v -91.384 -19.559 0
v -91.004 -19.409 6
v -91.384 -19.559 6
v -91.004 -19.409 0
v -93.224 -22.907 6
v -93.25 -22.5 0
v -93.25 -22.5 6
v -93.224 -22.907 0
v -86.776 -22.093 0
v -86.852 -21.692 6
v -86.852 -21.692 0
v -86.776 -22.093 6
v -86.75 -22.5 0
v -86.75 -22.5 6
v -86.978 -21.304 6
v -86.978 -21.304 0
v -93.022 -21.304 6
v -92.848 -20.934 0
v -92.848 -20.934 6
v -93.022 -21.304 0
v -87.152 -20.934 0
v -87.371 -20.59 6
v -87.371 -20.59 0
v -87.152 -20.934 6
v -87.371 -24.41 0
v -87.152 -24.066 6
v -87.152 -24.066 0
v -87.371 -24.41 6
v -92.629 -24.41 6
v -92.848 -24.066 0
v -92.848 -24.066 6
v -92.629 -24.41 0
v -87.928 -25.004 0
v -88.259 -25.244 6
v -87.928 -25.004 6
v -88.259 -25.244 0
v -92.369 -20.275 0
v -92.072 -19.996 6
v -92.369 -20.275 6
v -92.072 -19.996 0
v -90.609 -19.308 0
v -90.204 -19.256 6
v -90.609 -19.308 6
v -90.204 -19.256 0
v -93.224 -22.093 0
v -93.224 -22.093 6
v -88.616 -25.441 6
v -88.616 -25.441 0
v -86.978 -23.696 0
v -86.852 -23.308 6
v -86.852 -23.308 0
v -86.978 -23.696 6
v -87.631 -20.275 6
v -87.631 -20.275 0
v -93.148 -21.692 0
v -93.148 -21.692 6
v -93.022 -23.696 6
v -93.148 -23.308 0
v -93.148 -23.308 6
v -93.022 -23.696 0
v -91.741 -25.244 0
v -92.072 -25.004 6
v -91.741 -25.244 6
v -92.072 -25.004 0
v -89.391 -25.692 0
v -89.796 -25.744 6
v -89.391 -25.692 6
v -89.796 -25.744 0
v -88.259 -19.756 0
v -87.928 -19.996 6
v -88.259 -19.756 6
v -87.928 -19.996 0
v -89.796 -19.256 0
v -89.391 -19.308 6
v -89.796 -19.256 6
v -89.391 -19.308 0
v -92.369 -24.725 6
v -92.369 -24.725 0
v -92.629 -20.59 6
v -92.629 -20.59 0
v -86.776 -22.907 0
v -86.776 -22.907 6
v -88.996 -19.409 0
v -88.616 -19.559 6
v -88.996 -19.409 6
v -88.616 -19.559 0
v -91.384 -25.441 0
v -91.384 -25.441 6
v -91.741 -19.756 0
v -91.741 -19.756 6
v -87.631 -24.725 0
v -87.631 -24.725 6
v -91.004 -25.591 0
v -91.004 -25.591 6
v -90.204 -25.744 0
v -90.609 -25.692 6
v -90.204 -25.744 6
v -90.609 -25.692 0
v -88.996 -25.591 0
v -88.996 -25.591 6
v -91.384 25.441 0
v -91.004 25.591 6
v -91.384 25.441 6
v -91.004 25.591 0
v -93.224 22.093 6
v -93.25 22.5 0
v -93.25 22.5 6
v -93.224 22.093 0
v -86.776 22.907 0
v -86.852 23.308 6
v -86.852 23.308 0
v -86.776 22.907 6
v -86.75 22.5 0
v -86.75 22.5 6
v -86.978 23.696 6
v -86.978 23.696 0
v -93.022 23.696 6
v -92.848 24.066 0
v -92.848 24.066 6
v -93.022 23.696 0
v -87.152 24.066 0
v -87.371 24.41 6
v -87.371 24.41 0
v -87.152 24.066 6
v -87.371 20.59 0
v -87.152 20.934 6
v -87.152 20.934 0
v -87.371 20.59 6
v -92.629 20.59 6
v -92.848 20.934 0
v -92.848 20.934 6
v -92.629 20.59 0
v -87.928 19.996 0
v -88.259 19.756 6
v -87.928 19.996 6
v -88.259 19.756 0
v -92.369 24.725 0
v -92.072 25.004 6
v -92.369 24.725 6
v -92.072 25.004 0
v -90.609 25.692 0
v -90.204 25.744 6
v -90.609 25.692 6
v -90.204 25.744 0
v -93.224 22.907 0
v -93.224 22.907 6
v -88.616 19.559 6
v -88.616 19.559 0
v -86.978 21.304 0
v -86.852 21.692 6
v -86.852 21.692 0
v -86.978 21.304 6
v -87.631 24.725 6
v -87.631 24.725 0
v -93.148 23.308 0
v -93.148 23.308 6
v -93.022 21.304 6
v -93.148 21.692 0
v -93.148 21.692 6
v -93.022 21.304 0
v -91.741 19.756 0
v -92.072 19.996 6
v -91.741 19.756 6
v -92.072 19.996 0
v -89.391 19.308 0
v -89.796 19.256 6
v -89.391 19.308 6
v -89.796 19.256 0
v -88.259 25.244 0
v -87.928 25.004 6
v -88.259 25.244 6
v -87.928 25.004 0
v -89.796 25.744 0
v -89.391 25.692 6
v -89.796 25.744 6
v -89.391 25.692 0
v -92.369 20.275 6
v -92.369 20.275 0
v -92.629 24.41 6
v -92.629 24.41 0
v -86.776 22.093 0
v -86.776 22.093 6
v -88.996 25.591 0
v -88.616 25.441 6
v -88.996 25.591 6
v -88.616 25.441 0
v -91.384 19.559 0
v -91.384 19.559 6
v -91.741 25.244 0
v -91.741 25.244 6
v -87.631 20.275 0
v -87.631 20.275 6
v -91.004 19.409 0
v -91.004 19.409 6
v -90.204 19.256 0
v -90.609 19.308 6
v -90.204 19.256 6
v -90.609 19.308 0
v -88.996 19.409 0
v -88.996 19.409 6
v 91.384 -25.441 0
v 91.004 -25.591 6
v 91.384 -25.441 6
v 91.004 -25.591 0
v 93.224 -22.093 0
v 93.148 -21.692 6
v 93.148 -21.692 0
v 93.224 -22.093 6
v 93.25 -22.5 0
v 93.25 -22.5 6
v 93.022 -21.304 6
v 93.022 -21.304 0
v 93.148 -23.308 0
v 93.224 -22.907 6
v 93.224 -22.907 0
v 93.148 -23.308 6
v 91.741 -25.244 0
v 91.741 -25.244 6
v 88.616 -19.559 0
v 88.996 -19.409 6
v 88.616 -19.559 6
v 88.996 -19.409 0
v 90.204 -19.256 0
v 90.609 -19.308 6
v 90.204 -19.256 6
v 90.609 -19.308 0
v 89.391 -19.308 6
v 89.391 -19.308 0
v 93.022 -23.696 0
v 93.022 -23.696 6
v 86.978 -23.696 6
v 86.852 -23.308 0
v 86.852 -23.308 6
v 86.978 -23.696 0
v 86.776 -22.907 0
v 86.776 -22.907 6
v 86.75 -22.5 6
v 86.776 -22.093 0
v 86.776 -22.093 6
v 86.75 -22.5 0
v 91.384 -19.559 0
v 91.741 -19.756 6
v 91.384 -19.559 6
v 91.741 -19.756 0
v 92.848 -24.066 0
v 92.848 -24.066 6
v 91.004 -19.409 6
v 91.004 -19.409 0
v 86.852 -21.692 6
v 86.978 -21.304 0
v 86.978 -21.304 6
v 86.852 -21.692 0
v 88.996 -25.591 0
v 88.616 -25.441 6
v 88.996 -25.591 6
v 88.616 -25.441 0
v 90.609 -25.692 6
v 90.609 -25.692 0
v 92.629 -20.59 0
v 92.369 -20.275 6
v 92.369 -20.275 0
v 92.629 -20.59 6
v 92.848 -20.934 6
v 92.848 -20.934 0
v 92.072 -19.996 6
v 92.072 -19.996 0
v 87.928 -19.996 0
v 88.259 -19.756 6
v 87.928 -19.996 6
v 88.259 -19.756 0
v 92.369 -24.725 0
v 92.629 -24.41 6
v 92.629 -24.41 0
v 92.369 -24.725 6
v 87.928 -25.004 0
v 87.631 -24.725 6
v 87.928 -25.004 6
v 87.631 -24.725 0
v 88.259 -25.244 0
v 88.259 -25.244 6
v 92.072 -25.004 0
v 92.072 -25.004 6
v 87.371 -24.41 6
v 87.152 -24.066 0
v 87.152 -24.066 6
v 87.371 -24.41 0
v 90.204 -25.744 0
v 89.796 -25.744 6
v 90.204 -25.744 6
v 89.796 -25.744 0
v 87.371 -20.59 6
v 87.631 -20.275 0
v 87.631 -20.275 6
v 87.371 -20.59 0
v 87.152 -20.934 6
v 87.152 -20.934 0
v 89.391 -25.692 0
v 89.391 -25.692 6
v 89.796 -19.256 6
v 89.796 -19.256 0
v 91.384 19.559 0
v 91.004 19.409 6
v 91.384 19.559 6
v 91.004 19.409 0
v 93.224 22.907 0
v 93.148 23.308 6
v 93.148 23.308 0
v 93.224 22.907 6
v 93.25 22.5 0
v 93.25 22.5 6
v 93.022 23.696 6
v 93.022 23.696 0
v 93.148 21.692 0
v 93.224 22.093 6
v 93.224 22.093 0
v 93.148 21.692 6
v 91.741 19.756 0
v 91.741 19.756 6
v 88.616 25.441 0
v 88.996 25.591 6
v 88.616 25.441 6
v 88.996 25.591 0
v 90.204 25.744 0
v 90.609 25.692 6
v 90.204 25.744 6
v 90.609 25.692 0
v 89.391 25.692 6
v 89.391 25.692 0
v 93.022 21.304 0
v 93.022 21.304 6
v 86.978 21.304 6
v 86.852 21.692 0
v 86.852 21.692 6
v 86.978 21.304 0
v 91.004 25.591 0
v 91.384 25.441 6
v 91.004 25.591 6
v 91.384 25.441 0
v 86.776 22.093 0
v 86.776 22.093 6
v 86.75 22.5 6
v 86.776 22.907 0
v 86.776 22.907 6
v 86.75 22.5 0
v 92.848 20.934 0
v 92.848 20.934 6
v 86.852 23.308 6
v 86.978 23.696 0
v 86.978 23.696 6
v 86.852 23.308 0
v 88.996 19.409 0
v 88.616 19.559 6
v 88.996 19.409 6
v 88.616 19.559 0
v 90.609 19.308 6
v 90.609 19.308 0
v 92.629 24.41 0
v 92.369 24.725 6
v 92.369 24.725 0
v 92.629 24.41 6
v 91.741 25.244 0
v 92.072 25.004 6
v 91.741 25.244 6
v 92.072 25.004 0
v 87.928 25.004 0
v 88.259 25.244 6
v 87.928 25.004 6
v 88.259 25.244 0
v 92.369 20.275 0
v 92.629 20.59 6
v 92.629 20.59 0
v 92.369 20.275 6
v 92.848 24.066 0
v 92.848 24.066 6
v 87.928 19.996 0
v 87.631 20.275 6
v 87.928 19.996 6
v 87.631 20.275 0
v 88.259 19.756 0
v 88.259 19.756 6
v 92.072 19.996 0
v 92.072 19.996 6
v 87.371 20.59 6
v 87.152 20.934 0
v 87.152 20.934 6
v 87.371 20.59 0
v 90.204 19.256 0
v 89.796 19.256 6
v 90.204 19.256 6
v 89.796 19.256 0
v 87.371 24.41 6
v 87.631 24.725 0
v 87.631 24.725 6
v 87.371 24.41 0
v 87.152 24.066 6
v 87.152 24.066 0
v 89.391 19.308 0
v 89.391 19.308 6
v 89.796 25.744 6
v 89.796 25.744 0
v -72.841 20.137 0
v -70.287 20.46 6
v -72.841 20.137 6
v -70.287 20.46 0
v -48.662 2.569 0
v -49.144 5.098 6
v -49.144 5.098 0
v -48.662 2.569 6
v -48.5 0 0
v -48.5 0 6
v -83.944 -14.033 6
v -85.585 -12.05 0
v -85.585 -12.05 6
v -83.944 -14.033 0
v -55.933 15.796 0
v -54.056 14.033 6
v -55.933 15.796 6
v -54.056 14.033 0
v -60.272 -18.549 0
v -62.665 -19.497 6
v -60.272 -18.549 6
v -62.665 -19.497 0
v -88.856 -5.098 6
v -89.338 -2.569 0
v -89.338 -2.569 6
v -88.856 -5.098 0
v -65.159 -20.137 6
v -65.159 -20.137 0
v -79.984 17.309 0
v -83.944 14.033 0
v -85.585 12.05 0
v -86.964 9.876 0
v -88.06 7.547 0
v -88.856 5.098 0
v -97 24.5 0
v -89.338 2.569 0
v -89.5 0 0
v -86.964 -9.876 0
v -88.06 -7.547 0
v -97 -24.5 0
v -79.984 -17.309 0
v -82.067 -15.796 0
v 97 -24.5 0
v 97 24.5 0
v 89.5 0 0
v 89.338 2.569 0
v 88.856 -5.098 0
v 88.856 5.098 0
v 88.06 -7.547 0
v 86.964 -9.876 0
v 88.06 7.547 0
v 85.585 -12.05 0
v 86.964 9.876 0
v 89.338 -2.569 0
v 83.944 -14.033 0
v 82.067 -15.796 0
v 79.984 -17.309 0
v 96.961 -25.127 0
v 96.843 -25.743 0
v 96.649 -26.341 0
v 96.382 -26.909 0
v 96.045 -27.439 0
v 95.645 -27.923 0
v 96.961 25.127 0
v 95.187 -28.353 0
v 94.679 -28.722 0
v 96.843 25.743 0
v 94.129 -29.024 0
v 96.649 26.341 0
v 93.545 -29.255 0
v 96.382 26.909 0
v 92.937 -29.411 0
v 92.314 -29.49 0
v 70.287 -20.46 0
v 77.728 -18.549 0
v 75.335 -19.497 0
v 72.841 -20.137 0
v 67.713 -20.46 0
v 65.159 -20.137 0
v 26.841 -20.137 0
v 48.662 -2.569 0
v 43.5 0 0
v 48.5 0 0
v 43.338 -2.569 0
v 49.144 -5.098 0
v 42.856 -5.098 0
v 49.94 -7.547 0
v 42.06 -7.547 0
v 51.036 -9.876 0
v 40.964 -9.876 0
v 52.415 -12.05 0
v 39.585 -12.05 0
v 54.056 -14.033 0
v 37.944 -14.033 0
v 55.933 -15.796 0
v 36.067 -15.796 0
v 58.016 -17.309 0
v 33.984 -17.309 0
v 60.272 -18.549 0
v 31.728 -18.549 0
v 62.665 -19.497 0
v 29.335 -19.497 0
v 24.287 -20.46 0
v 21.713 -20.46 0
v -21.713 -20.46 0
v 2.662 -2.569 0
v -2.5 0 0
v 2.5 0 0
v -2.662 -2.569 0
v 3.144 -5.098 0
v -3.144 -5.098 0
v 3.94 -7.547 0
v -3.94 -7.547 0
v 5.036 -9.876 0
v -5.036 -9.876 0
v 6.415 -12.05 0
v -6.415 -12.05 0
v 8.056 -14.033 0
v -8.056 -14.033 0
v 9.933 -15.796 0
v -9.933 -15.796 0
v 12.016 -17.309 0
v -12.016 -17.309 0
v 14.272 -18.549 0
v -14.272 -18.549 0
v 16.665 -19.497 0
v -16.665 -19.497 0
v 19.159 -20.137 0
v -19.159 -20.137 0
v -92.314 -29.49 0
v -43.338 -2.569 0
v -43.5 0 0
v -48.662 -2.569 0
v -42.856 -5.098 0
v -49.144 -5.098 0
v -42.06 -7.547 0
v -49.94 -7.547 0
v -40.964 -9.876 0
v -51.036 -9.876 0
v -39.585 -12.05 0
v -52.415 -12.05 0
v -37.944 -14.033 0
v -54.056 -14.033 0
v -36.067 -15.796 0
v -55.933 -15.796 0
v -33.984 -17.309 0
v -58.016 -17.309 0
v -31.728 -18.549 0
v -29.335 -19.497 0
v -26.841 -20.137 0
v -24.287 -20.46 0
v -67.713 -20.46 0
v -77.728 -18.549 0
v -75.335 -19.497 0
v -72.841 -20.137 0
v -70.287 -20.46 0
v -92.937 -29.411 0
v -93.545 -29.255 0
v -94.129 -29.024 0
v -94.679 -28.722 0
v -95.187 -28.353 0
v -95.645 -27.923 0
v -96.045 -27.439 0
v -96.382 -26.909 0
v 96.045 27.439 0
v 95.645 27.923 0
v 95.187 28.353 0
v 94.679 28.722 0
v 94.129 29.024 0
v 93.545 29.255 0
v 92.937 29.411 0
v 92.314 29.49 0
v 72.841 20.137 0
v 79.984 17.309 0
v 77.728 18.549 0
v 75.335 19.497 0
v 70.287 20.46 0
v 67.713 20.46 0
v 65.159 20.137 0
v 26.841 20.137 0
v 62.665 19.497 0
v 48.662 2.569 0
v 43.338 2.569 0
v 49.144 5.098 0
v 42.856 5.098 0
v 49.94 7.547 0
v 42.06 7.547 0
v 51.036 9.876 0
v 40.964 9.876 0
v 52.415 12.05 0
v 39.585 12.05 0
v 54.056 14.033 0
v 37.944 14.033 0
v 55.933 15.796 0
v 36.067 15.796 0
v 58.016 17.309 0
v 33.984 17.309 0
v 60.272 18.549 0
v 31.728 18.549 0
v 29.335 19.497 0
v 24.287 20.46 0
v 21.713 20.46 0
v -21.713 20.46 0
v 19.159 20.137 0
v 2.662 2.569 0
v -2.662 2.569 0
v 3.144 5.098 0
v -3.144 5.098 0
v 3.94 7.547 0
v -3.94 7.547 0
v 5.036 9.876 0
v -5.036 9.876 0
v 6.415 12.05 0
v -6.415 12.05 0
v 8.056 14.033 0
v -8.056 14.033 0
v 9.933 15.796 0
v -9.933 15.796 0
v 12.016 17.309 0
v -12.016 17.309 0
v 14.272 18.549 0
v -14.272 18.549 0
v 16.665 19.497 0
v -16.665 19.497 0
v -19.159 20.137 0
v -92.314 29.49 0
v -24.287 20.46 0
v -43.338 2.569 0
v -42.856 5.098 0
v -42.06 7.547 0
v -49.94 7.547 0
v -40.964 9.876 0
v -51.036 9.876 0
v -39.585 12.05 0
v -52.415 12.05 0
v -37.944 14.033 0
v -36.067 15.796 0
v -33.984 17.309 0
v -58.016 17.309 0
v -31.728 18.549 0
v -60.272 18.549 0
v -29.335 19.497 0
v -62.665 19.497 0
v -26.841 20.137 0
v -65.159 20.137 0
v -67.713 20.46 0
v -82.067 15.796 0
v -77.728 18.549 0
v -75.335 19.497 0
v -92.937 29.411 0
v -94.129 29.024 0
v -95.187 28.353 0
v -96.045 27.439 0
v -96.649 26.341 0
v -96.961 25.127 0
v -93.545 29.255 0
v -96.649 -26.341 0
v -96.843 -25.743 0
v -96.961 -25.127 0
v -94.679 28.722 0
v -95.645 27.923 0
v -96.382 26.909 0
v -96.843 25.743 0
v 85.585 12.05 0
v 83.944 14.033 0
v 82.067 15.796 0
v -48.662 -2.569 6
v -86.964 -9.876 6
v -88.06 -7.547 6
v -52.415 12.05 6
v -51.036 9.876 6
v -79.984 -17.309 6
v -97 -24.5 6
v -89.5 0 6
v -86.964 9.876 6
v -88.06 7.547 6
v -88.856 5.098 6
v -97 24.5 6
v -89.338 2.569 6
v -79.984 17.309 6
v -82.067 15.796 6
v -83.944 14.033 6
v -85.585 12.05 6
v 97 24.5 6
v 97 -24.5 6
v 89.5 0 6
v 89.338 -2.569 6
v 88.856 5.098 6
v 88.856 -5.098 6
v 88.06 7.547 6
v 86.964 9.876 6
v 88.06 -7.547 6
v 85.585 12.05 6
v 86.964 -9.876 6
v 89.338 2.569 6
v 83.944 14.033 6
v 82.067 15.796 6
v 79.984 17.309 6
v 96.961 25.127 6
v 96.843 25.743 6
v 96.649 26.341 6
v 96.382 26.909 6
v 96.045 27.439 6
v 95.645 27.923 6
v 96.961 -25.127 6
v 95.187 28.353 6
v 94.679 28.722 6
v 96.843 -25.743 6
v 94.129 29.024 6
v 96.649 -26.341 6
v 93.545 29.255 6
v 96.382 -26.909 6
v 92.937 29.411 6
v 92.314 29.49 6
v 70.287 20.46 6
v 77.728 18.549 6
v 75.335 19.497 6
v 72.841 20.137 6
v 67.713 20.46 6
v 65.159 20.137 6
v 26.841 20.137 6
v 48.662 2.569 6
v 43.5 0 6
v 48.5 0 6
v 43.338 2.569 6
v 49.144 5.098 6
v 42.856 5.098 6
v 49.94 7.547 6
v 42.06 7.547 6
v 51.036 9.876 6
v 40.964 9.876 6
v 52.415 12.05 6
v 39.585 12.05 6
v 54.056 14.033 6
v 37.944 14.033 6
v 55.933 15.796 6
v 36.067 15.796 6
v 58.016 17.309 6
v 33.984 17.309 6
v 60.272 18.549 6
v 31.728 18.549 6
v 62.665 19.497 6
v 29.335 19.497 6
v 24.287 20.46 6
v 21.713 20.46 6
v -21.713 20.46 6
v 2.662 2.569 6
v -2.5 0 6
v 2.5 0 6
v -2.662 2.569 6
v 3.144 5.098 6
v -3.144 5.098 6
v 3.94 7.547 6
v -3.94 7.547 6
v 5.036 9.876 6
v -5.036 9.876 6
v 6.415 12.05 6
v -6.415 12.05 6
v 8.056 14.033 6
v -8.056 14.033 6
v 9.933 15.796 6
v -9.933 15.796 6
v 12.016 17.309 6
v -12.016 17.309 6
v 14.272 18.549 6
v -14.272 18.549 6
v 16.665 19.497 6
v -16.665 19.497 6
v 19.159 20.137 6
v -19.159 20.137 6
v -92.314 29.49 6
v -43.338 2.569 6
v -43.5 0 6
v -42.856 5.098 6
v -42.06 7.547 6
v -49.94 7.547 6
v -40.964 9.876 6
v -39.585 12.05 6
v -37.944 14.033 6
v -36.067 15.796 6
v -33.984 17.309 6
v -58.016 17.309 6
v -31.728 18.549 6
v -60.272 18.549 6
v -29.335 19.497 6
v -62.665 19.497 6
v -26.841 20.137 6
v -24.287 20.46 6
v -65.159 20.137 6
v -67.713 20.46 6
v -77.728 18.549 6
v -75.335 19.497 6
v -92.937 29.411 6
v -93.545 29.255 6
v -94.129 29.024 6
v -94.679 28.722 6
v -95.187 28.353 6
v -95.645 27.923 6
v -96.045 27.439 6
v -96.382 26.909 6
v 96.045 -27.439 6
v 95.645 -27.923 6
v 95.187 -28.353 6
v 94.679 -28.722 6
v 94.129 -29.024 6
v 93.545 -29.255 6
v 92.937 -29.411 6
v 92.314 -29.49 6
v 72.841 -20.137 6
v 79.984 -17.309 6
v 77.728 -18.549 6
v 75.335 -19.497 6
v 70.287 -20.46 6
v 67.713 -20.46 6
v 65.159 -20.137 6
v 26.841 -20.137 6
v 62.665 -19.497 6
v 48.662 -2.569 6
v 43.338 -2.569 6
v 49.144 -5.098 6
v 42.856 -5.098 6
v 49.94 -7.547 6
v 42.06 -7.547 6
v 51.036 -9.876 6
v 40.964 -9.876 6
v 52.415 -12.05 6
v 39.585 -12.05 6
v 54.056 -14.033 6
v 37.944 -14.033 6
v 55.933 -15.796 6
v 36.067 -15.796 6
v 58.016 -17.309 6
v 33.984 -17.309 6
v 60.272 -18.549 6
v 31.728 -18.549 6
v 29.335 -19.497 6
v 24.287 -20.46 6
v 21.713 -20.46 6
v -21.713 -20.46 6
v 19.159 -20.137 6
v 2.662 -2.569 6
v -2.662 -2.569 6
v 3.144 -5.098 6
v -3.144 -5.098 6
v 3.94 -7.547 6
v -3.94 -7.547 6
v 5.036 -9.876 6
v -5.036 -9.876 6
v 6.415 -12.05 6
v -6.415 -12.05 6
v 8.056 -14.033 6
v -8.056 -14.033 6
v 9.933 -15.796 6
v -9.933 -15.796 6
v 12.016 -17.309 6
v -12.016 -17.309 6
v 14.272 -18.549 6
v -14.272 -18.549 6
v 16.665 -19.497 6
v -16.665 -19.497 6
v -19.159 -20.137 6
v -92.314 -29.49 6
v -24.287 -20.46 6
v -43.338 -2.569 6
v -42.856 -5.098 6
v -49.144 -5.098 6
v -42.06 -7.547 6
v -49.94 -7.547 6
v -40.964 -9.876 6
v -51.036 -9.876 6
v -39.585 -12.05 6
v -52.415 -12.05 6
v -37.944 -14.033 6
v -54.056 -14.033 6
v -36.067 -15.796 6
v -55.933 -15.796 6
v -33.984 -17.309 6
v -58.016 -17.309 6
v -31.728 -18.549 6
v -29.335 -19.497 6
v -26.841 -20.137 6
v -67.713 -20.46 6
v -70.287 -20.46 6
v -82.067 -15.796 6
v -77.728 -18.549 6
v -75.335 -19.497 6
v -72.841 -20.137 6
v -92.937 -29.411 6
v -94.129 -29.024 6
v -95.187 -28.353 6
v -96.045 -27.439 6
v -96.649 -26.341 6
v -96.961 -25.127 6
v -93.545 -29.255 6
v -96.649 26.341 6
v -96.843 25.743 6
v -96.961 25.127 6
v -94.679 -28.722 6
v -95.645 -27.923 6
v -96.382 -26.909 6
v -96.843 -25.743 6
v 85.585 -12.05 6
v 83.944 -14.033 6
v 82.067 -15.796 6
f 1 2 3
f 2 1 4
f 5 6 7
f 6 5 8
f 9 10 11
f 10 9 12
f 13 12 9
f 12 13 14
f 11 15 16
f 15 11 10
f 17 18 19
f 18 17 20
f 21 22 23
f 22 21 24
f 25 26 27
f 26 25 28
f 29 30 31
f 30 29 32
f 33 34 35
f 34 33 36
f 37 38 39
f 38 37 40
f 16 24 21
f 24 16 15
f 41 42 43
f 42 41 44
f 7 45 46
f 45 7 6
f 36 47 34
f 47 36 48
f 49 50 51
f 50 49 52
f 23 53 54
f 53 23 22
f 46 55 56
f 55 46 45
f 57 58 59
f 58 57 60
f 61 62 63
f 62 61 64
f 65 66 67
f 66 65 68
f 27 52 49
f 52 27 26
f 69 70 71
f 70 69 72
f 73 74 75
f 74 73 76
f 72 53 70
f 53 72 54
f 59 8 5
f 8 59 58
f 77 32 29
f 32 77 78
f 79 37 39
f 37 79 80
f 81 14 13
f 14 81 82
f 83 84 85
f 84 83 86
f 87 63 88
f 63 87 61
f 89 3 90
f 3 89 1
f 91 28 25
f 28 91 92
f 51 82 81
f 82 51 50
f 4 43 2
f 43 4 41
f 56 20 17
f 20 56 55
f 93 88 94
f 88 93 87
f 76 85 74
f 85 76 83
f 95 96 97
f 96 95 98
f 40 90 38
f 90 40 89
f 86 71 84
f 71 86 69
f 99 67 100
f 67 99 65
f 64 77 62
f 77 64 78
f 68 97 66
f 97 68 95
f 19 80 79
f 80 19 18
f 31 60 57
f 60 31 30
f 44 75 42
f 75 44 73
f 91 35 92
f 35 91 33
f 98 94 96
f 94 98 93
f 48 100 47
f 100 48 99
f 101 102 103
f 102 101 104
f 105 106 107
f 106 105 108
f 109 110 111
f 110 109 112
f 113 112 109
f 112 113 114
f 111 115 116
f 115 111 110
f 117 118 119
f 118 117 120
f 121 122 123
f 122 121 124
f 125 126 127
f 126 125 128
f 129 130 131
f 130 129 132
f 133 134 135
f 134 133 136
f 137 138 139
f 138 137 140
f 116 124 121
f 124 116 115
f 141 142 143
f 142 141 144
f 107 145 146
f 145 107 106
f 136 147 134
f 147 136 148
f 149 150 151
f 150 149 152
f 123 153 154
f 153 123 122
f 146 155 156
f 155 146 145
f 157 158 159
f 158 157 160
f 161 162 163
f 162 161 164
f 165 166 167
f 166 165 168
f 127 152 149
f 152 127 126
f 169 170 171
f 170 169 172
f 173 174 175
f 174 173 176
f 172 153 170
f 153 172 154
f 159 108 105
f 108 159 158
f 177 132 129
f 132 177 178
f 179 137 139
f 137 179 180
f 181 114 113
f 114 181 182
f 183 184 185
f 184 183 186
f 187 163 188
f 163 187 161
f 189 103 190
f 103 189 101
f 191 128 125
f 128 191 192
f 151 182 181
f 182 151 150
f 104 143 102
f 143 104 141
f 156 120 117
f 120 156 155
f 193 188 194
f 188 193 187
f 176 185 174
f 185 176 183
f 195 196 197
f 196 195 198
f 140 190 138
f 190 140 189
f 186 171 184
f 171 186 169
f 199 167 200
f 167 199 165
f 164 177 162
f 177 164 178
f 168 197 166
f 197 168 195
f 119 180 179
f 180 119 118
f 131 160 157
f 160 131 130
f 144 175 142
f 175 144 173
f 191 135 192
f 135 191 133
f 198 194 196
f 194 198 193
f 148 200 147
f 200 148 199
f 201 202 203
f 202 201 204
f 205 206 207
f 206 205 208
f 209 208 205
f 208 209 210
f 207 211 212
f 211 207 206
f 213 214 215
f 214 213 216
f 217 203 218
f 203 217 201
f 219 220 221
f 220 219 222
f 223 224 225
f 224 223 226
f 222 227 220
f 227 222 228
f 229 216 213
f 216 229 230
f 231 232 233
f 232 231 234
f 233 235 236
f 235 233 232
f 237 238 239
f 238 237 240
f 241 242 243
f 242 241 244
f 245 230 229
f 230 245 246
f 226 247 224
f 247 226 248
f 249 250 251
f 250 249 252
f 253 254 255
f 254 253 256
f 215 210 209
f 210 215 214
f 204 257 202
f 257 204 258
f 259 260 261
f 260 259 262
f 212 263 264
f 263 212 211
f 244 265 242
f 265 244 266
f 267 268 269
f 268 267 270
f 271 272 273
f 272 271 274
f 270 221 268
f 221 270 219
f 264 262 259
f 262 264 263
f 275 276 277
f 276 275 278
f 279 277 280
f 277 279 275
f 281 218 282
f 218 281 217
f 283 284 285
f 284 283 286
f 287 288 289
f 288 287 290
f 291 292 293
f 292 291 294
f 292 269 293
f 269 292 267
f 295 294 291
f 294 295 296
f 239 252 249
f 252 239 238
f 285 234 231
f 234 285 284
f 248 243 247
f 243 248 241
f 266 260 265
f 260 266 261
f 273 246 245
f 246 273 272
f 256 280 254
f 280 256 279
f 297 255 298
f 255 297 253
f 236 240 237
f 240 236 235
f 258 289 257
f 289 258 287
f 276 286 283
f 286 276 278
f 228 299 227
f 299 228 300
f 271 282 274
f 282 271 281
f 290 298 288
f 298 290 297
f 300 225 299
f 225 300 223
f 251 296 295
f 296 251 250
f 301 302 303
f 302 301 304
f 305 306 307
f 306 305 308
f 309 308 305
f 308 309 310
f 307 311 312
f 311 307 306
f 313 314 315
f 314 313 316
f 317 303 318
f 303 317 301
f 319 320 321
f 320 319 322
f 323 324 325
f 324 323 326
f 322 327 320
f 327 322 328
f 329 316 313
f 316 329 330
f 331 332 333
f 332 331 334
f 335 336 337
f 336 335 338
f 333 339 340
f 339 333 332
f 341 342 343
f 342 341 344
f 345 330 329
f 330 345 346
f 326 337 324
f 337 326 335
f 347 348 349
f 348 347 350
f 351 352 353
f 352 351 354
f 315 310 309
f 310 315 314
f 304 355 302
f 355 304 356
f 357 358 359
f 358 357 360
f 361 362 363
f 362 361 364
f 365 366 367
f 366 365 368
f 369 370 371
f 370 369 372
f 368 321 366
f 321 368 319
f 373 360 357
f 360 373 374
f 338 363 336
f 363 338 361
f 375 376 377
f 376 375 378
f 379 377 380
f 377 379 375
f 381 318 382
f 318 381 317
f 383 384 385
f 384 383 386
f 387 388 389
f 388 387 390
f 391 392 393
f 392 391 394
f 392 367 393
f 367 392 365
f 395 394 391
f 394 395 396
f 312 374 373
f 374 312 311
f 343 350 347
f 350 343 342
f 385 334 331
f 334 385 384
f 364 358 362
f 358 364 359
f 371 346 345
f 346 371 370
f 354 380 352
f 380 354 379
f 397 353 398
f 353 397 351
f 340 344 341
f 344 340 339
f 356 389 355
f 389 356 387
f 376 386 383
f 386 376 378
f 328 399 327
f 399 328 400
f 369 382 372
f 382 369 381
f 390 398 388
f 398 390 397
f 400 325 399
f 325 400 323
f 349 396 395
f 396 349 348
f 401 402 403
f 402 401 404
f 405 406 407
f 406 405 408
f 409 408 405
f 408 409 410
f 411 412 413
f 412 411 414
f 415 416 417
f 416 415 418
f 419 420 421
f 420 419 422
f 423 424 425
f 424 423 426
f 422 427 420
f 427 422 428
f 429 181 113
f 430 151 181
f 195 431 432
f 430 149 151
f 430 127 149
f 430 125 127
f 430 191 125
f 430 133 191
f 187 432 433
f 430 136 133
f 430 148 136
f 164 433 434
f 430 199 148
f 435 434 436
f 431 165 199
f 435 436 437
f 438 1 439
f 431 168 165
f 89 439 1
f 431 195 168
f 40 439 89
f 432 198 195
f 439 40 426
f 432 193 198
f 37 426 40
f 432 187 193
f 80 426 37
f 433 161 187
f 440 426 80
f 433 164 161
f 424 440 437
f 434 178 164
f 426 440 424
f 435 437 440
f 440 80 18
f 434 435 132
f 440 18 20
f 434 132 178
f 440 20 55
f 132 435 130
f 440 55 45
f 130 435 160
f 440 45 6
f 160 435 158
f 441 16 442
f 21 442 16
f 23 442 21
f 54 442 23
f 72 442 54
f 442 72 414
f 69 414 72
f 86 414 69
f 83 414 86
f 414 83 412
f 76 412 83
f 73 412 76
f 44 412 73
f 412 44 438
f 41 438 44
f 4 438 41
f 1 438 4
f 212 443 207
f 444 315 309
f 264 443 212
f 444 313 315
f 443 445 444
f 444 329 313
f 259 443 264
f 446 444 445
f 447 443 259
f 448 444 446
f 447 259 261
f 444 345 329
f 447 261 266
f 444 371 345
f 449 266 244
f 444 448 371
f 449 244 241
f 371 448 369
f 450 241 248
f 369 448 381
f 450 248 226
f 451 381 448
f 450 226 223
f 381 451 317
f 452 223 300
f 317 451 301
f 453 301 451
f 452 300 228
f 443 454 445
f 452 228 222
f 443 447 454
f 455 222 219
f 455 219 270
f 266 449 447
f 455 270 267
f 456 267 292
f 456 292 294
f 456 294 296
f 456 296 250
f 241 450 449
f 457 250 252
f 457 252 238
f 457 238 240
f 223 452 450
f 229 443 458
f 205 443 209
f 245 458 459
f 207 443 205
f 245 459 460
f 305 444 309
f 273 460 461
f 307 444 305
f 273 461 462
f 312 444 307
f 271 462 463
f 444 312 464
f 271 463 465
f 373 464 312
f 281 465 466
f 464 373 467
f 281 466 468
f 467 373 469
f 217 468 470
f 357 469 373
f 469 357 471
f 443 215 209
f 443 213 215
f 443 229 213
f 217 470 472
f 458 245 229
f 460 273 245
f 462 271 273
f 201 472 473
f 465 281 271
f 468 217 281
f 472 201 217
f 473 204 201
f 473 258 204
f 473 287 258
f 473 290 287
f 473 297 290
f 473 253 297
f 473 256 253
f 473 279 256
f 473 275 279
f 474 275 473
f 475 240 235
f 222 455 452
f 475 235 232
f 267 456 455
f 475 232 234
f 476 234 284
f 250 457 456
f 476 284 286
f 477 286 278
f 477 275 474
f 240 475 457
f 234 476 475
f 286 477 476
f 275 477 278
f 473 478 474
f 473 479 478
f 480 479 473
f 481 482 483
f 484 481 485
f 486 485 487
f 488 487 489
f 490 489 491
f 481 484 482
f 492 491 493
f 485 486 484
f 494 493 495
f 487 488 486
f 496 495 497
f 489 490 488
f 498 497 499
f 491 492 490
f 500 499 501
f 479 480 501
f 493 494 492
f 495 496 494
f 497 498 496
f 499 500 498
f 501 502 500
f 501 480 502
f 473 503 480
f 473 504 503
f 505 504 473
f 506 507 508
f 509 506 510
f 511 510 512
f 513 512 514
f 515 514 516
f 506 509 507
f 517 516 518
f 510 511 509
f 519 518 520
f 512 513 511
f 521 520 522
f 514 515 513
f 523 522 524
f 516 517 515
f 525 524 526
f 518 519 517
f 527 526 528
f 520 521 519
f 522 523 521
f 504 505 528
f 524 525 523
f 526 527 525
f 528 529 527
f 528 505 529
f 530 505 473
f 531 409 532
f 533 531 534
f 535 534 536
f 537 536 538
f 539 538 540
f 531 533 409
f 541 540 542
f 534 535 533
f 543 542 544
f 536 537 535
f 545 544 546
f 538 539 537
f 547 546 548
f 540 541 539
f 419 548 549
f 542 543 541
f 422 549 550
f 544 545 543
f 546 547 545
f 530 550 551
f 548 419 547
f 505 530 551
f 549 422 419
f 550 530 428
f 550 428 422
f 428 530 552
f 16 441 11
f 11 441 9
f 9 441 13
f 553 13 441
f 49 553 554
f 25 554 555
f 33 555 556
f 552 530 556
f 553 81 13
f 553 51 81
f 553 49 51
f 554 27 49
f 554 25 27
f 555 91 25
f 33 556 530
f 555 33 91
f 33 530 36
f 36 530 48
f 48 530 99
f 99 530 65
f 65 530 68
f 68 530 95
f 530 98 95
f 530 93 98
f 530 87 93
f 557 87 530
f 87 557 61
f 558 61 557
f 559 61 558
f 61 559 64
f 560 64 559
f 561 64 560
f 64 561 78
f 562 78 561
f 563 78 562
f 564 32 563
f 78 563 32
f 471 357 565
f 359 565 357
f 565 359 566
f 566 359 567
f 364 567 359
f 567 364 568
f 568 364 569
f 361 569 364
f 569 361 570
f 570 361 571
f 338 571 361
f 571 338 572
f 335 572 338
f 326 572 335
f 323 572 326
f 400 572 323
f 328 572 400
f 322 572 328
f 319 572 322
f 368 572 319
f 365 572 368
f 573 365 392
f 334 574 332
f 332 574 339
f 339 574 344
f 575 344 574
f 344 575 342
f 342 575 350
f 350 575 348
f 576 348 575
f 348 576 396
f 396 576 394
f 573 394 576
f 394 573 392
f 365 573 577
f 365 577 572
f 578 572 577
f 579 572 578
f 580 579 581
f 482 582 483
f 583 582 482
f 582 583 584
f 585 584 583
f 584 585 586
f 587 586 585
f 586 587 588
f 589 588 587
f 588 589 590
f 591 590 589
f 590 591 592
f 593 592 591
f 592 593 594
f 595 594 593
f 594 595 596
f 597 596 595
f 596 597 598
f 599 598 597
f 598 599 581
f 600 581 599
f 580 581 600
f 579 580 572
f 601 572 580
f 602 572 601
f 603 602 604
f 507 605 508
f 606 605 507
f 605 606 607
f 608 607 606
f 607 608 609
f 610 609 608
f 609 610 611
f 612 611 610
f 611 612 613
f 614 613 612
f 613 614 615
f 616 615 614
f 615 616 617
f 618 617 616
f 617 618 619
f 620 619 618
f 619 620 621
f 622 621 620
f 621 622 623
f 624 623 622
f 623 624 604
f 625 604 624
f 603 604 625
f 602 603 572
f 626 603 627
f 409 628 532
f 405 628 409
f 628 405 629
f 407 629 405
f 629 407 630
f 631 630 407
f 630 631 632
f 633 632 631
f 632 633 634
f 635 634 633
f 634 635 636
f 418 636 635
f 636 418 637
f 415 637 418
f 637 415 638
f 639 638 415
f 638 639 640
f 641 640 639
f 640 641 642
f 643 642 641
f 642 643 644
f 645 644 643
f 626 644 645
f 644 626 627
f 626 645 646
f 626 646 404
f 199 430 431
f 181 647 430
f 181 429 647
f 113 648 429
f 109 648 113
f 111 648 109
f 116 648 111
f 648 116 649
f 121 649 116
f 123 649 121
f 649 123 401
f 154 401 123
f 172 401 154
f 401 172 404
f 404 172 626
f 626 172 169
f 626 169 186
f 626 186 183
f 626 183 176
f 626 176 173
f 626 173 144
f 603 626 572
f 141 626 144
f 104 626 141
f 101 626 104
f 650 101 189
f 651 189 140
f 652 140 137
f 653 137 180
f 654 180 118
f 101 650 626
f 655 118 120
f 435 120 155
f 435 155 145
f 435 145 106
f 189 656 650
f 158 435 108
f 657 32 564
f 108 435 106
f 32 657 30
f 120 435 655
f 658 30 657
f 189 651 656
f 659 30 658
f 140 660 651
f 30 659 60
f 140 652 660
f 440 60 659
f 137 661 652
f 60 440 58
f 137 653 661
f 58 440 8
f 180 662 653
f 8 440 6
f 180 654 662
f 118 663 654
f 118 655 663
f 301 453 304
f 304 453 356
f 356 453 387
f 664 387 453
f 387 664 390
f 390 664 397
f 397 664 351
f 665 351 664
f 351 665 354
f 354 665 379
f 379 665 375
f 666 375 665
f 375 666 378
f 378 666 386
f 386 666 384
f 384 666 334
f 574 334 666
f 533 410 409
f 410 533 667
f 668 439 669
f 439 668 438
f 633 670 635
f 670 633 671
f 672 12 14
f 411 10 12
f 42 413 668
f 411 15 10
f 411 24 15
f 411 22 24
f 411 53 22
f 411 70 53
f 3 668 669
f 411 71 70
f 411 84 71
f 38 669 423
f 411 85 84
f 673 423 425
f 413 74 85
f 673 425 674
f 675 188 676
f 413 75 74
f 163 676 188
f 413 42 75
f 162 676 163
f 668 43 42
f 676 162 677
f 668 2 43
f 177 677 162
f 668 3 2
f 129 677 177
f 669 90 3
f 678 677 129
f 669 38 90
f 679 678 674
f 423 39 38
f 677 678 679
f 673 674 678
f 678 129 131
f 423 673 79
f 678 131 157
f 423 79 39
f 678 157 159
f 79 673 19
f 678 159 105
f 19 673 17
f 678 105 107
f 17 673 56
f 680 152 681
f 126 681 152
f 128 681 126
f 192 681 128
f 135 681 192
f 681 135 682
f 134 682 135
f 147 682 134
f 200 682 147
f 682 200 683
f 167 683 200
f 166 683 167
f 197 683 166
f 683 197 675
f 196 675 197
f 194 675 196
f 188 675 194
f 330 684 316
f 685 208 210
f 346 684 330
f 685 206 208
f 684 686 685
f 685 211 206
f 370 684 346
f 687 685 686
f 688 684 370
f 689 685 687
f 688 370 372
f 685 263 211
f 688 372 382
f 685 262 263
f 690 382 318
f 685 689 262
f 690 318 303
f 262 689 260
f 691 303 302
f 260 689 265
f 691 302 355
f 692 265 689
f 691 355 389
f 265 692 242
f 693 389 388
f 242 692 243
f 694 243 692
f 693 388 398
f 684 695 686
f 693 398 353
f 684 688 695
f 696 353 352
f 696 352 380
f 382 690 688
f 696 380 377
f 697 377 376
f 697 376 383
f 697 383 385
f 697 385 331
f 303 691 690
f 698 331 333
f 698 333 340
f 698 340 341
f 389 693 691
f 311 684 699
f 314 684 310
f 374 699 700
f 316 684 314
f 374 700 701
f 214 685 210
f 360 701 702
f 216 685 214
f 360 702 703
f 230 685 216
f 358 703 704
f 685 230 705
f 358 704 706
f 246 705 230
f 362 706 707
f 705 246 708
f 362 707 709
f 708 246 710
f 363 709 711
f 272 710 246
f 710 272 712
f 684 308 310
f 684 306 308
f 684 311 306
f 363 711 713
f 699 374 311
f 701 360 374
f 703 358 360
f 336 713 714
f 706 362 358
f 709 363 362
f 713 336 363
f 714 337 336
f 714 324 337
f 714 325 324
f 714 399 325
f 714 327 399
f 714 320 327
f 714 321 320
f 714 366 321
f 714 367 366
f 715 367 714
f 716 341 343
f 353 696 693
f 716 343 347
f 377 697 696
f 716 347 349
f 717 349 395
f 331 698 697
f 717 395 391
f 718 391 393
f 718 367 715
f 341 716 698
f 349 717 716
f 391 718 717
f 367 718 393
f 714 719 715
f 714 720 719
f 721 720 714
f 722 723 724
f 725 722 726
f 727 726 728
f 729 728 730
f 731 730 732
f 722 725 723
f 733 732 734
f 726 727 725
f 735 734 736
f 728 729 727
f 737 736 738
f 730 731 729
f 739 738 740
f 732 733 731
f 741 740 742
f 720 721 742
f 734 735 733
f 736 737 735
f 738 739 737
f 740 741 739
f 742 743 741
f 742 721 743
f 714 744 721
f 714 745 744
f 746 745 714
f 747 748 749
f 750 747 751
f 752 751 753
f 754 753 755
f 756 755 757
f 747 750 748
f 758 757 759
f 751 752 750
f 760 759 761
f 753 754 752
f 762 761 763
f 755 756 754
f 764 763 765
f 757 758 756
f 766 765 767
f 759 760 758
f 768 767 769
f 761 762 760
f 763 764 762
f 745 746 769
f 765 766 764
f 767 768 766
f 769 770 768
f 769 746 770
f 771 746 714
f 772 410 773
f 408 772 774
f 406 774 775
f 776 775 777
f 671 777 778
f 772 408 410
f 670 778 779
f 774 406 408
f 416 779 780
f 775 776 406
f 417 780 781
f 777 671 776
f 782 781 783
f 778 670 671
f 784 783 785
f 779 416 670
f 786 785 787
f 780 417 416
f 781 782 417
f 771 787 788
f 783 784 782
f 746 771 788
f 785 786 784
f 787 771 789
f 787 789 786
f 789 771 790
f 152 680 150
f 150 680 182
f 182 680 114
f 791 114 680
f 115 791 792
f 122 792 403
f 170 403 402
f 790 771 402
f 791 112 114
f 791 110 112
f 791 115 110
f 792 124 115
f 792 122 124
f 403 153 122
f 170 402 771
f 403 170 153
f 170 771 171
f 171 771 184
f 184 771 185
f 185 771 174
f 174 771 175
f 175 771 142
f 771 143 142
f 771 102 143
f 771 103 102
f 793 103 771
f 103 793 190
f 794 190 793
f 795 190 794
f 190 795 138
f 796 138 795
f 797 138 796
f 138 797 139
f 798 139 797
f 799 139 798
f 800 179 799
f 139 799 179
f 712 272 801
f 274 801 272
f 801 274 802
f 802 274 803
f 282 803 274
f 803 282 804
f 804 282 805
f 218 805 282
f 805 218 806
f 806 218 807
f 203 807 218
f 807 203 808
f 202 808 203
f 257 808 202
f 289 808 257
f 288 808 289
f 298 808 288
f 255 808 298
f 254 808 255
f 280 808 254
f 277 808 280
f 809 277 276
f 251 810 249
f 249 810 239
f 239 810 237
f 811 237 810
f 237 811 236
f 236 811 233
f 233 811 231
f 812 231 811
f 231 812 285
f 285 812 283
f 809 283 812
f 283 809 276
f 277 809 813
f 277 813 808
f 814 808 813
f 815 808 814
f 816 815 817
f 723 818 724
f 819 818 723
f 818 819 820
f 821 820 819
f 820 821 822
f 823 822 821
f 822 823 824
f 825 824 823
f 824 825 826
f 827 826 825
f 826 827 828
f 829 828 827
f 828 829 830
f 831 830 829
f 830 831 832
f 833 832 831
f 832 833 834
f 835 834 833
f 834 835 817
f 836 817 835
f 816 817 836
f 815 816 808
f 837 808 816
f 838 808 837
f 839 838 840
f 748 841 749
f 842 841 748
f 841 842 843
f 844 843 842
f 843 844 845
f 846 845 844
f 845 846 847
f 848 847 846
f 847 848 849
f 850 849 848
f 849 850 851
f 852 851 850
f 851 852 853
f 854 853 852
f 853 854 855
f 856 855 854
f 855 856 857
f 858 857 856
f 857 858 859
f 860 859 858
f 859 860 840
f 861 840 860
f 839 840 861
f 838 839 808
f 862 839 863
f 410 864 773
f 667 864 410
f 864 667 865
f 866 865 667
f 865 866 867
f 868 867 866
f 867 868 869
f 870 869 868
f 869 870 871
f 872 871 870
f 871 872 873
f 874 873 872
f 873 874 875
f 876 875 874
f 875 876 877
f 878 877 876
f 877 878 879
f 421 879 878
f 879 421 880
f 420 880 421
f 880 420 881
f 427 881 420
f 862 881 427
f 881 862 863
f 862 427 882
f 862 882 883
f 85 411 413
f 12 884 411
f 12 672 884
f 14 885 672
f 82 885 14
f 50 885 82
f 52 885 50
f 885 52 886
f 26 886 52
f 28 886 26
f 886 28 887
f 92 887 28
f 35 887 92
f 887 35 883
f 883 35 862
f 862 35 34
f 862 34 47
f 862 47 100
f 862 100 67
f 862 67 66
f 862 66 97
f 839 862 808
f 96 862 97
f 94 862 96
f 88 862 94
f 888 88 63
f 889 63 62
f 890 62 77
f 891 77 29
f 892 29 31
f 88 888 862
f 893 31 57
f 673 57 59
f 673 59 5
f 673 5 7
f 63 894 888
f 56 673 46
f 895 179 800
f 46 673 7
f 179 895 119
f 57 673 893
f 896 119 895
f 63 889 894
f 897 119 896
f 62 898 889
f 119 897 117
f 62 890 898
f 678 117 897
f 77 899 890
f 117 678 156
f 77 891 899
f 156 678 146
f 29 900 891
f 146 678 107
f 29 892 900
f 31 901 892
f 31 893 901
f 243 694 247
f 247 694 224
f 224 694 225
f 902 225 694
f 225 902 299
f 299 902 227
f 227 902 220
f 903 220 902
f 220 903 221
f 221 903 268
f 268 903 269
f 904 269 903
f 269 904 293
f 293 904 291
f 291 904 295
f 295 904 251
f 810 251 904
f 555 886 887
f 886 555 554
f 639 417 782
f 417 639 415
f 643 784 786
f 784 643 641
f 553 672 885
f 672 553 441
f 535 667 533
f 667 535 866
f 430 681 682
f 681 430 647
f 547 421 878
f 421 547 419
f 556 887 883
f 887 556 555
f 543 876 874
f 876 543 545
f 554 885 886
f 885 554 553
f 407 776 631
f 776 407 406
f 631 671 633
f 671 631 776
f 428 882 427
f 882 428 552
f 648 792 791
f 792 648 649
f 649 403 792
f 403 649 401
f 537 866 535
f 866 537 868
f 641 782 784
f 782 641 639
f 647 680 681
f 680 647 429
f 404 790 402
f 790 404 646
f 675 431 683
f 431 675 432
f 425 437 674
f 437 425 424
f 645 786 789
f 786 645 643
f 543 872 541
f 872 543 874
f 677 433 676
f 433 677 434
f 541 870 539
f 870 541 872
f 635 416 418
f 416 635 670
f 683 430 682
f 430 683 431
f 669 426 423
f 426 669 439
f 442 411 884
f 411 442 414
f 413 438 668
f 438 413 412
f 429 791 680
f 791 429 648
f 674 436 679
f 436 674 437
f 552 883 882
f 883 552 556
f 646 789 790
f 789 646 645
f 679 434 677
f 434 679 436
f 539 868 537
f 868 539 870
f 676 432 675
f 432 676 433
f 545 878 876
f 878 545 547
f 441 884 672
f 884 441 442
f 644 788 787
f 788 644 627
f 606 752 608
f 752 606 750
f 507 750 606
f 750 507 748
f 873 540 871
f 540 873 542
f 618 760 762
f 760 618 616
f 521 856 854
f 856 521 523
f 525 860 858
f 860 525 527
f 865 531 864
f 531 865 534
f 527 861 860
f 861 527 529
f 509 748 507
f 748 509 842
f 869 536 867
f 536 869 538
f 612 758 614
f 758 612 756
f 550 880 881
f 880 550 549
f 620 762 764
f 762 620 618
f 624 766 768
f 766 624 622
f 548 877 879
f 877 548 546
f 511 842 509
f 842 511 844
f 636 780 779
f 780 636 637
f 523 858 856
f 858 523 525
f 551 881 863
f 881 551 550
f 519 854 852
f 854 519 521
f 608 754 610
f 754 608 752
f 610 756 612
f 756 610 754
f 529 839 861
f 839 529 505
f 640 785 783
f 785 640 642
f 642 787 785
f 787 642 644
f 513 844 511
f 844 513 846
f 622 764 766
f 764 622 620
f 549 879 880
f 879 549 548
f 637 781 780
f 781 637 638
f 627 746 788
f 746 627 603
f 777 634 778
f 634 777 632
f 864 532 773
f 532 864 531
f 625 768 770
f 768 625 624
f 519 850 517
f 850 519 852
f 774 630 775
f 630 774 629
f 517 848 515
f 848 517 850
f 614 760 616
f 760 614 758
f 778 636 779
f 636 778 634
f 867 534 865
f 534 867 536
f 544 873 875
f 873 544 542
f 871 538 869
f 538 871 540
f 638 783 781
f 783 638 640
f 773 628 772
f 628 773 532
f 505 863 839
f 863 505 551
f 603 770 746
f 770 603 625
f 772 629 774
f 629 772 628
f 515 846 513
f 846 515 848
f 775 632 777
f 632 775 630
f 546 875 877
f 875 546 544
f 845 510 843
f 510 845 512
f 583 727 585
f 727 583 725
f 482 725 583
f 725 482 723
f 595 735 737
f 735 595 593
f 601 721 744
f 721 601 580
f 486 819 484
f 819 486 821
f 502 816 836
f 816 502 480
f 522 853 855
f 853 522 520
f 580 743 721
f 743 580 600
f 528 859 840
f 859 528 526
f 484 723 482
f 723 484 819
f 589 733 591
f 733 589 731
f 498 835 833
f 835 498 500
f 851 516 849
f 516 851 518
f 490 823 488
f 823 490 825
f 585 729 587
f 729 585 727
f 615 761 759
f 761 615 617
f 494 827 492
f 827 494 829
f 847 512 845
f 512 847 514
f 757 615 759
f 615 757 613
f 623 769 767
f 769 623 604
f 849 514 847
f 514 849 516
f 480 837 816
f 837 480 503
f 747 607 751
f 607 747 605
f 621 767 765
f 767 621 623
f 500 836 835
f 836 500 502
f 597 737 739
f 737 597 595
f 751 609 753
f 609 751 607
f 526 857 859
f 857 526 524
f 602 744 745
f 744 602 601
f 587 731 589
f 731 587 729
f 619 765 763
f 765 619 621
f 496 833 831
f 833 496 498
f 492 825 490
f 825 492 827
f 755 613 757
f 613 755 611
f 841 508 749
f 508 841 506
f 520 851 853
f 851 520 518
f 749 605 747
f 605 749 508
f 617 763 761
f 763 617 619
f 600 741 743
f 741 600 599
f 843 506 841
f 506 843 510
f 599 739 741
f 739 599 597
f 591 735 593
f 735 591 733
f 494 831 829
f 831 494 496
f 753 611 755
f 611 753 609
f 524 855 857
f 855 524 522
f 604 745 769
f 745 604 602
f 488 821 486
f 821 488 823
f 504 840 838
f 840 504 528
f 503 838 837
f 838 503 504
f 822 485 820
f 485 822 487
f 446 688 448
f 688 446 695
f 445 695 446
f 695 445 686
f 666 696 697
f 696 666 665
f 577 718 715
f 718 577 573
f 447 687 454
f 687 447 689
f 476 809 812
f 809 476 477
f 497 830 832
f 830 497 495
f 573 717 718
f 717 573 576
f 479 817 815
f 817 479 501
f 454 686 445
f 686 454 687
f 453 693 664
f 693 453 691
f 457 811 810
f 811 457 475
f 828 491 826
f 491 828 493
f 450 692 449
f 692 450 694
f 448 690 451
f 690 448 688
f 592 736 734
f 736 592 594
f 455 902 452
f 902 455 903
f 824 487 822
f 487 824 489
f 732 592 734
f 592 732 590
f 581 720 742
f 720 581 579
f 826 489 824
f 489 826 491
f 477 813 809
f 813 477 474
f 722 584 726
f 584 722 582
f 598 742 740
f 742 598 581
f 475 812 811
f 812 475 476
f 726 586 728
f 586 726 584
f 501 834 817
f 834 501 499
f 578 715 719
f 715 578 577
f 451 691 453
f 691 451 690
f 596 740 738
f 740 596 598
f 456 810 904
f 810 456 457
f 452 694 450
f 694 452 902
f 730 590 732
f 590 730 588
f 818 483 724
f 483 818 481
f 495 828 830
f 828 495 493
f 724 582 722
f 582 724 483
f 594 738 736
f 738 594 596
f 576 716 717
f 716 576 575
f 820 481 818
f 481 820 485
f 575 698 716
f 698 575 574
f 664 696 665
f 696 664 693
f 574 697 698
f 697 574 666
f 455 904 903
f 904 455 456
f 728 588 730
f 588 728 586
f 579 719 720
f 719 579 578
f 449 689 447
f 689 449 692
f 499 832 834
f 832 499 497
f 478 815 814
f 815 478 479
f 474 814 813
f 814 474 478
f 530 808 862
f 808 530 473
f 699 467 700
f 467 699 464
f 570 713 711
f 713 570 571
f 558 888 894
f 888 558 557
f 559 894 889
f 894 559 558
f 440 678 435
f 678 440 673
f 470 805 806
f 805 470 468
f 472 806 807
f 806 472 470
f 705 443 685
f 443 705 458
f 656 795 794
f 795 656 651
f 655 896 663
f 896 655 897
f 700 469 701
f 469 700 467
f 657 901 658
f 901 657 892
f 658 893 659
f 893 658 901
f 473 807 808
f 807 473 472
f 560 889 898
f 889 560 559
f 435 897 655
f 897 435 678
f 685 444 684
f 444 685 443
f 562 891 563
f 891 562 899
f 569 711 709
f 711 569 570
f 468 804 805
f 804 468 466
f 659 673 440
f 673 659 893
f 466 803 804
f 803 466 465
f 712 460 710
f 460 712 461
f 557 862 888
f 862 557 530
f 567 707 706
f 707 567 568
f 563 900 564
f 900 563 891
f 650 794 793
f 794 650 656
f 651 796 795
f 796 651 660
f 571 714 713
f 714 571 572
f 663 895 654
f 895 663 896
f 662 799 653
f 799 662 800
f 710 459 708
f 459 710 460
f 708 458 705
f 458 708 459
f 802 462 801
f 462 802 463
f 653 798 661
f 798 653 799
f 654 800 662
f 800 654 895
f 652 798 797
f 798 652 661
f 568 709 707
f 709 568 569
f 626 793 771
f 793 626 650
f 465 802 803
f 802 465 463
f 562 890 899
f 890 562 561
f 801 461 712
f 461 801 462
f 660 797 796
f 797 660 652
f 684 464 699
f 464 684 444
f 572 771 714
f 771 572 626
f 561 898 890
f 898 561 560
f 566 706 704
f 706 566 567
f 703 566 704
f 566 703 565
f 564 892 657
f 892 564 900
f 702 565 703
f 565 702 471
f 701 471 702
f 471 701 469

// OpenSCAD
$fn = 50;


difference() {
	union() {
		hull() {
			translate(v = [-92.0000000000, 24.5000000000, 0]) {
				cylinder(h = 6, r = 5);
			}
			translate(v = [92.0000000000, 24.5000000000, 0]) {
				cylinder(h = 6, r = 5);
			}
			translate(v = [-92.0000000000, -24.5000000000, 0]) {
				cylinder(h = 6, r = 5);
			}
			translate(v = [92.0000000000, -24.5000000000, 0]) {
				cylinder(h = 6, r = 5);
			}
		}
	}
	union() {
		#translate(v = [-90.0000000000, -22.5000000000, -100.0000000000]) {
			cylinder(h = 200, r = 3.2500000000);
		}
		#translate(v = [-90.0000000000, 22.5000000000, -100.0000000000]) {
			cylinder(h = 200, r = 3.2500000000);
		}
		#translate(v = [90.0000000000, -22.5000000000, -100.0000000000]) {
			cylinder(h = 200, r = 3.2500000000);
		}
		#translate(v = [90.0000000000, 22.5000000000, -100.0000000000]) {
			cylinder(h = 200, r = 3.2500000000);
		}
		#translate(v = [-69.0000000000, 0, 0]) {
			cylinder(h = 6, r = 20.5000000000);
		}
		#translate(v = [-23.0000000000, 0, 0]) {
			cylinder(h = 6, r = 20.5000000000);
		}
		#translate(v = [23.0000000000, 0, 0]) {
			cylinder(h = 6, r = 20.5000000000);
		}
		#translate(v = [69.0000000000, 0, 0]) {
			cylinder(h = 6, r = 20.5000000000);
		}
	}
}
